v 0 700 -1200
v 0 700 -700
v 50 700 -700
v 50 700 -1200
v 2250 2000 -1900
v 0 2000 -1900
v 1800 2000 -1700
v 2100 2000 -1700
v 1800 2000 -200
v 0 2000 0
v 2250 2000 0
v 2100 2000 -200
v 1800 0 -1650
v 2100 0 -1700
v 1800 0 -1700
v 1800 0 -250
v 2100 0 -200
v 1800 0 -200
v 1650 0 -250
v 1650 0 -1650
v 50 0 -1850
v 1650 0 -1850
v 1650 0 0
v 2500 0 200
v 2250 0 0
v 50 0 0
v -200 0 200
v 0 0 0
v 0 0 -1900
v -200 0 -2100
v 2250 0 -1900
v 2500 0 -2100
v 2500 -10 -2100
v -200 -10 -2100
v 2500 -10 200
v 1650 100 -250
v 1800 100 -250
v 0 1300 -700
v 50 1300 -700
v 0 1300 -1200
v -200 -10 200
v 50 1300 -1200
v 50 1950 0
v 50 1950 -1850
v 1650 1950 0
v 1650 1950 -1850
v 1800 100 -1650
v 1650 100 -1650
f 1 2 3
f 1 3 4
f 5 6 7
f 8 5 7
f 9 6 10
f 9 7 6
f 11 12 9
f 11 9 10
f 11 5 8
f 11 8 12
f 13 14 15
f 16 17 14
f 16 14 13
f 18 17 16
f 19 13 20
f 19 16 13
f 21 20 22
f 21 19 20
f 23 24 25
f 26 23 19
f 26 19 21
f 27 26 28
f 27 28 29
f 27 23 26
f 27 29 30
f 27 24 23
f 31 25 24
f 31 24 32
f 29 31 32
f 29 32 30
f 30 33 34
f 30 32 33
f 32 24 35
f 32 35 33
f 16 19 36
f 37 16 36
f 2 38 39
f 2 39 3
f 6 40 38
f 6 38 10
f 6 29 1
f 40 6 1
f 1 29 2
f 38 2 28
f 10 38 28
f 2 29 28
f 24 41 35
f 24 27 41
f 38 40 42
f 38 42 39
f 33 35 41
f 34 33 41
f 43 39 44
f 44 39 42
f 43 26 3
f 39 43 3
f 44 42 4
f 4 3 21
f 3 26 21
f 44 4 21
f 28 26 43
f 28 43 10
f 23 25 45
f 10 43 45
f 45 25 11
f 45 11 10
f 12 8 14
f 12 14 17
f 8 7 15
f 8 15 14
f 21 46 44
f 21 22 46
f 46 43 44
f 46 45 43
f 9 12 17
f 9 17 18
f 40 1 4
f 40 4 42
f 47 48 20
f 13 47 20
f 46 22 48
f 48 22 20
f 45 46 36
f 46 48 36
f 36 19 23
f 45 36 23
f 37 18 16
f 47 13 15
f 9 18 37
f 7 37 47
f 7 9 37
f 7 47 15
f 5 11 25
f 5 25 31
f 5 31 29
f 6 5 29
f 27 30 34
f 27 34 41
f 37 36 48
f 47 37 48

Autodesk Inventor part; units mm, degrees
ref_plane "YZ Plane" through (0, 0, 0) normal (1, 0, 0) x (0, 1, 0)
ref_plane "XZ Plane" through (0, 0, 0) normal (0, 1, 0) x (-1, 0, 0)
ref_plane "XY Plane" through (0, 0, 0) normal (0, 0, 1) x (1, 0, 0)
sketch "Sketch2" plane through (0, 0, 0) normal (0, 1, 0) x (-1, 0, 0)
  line L0 (200, 200) -> (-2500, 200)
  line L1 (-2500, 200) -> (-2500, -2100)
  line L2 (-2500, -2100) -> (200, -2100)
  line L3 (200, -2100) -> (200, 200)
  point P0 (0, 0)
  dimension "d0" = 200
  dimension "d1" = 2300
  dimension "d2" = 2700
  dimension "d3" = 200
extrude "Extrusion1" add sketch "Sketch2" against normal blind 10
sketch "Sketch3" plane through (0, 0, 0) normal (0, 1, 0) x (1, 0, 0)
  line L0 (1650, 0) -> (2250, 0)
  line L1 (2250, 0) -> (2250, 1900)
  line L2 (2250, 1900) -> (1650, 1900)
  line L3 (1650, 1900) -> (1650, 0)
  line L4 (0, 0) -> (50, 0)
  line L5 (50, 0) -> (50, 1900)
  line L6 (50, 1900) -> (0, 1900)
  line L7 (0, 1900) -> (0, 0)
  line L8 (50, 1900) -> (1650, 1900)
  line L9 (1650, 1900) -> (1650, 1850)
  line L10 (1650, 1850) -> (50, 1850)
  line L11 (50, 1850) -> (50, 1900)
  dimension "d6" = 1900
  dimension "d8" = 1900
  dimension "d9" = 1650
  dimension "d10" = 600
  dimension "d11" = 50
  dimension "d12" = 1900
  dimension "d13" = 50
extrude "Extrusion2" add sketch "Sketch3" along normal blind 2000
sketch "Sketch4" plane through (0, 2000, 0) normal (0, 1, 0) x (1, 0, 0)
  line L0 (1650, 1850) -> (1650, 0) projected
  line L1 (1650, 0) -> (2250, 0) projected
  line L2 (2250, 0) -> (2250, 1900) projected
  line L3 (2250, 1900) -> (0, 1900) projected
  line L4 (1800, 1700) -> (2100, 1700)
  line L5 (2100, 1700) -> (2100, 200)
  line L6 (2100, 200) -> (1800, 200)
  line L7 (1800, 200) -> (1800, 1700)
  dimension "d16" = 150
  dimension "d17" = 150
  dimension "d18" = 200
  dimension "d19" = 200
extrude "Extrusion3" cut sketch "Sketch4" against normal blind 2000
sketch "Sketch5" plane through (1650, 0, -1850) normal (-1, 0, 0) x (0, 0, 1)
  line L0 (1850, 0) -> (0, 0) projected
  line L1 (1850, 0) -> (1850, 2000) projected
  line L2 (200, 0) -> (1600, 0)
  line L3 (1600, 0) -> (1600, 100)
  line L4 (1600, 100) -> (200, 100)
  line L5 (200, 100) -> (200, 0)
  dimension "d22" = 100
  dimension "d24" = 1400
  dimension "d25" = 250
extrude "Extrusion4" cut sketch "Sketch5" against normal blind 200
sketch "Sketch6" plane through (0, 0, -1900) normal (-1, 0, 0) x (0, 0, 1)
  line L0 (1900, 0) -> (0, 0) projected
  line L1 (0, 0) -> (0, 2000) projected
  line L2 (700, 1300) -> (1200, 1300)
  line L3 (1200, 1300) -> (1200, 700)
  line L4 (1200, 700) -> (700, 700)
  line L5 (700, 700) -> (700, 1300)
  dimension "d28" = 500
  dimension "d30" = 600
  dimension "d31" = 700
  dimension "d32" = 700
extrude "Extrusion5" cut sketch "Sketch6" against normal blind 200
sketch "Sketch7" plane through (1650, 0, 0) normal (-1, 0, 0) x (0, 0, 1)
  line L0 (0, 0) -> (0, 2000) projected
  line L1 (-1850, 2000) -> (0, 2000)
  line L2 (0, 2000) -> (0, 1950)
  line L3 (0, 1950) -> (-1850, 1950)
  line L4 (-1850, 1950) -> (-1850, 2000)
  dimension "d35" = 50
extrude "Extrusion6" add sketch "Sketch7" along normal blind 1600
properties part number "Bouchair_Solar_Chimney"
